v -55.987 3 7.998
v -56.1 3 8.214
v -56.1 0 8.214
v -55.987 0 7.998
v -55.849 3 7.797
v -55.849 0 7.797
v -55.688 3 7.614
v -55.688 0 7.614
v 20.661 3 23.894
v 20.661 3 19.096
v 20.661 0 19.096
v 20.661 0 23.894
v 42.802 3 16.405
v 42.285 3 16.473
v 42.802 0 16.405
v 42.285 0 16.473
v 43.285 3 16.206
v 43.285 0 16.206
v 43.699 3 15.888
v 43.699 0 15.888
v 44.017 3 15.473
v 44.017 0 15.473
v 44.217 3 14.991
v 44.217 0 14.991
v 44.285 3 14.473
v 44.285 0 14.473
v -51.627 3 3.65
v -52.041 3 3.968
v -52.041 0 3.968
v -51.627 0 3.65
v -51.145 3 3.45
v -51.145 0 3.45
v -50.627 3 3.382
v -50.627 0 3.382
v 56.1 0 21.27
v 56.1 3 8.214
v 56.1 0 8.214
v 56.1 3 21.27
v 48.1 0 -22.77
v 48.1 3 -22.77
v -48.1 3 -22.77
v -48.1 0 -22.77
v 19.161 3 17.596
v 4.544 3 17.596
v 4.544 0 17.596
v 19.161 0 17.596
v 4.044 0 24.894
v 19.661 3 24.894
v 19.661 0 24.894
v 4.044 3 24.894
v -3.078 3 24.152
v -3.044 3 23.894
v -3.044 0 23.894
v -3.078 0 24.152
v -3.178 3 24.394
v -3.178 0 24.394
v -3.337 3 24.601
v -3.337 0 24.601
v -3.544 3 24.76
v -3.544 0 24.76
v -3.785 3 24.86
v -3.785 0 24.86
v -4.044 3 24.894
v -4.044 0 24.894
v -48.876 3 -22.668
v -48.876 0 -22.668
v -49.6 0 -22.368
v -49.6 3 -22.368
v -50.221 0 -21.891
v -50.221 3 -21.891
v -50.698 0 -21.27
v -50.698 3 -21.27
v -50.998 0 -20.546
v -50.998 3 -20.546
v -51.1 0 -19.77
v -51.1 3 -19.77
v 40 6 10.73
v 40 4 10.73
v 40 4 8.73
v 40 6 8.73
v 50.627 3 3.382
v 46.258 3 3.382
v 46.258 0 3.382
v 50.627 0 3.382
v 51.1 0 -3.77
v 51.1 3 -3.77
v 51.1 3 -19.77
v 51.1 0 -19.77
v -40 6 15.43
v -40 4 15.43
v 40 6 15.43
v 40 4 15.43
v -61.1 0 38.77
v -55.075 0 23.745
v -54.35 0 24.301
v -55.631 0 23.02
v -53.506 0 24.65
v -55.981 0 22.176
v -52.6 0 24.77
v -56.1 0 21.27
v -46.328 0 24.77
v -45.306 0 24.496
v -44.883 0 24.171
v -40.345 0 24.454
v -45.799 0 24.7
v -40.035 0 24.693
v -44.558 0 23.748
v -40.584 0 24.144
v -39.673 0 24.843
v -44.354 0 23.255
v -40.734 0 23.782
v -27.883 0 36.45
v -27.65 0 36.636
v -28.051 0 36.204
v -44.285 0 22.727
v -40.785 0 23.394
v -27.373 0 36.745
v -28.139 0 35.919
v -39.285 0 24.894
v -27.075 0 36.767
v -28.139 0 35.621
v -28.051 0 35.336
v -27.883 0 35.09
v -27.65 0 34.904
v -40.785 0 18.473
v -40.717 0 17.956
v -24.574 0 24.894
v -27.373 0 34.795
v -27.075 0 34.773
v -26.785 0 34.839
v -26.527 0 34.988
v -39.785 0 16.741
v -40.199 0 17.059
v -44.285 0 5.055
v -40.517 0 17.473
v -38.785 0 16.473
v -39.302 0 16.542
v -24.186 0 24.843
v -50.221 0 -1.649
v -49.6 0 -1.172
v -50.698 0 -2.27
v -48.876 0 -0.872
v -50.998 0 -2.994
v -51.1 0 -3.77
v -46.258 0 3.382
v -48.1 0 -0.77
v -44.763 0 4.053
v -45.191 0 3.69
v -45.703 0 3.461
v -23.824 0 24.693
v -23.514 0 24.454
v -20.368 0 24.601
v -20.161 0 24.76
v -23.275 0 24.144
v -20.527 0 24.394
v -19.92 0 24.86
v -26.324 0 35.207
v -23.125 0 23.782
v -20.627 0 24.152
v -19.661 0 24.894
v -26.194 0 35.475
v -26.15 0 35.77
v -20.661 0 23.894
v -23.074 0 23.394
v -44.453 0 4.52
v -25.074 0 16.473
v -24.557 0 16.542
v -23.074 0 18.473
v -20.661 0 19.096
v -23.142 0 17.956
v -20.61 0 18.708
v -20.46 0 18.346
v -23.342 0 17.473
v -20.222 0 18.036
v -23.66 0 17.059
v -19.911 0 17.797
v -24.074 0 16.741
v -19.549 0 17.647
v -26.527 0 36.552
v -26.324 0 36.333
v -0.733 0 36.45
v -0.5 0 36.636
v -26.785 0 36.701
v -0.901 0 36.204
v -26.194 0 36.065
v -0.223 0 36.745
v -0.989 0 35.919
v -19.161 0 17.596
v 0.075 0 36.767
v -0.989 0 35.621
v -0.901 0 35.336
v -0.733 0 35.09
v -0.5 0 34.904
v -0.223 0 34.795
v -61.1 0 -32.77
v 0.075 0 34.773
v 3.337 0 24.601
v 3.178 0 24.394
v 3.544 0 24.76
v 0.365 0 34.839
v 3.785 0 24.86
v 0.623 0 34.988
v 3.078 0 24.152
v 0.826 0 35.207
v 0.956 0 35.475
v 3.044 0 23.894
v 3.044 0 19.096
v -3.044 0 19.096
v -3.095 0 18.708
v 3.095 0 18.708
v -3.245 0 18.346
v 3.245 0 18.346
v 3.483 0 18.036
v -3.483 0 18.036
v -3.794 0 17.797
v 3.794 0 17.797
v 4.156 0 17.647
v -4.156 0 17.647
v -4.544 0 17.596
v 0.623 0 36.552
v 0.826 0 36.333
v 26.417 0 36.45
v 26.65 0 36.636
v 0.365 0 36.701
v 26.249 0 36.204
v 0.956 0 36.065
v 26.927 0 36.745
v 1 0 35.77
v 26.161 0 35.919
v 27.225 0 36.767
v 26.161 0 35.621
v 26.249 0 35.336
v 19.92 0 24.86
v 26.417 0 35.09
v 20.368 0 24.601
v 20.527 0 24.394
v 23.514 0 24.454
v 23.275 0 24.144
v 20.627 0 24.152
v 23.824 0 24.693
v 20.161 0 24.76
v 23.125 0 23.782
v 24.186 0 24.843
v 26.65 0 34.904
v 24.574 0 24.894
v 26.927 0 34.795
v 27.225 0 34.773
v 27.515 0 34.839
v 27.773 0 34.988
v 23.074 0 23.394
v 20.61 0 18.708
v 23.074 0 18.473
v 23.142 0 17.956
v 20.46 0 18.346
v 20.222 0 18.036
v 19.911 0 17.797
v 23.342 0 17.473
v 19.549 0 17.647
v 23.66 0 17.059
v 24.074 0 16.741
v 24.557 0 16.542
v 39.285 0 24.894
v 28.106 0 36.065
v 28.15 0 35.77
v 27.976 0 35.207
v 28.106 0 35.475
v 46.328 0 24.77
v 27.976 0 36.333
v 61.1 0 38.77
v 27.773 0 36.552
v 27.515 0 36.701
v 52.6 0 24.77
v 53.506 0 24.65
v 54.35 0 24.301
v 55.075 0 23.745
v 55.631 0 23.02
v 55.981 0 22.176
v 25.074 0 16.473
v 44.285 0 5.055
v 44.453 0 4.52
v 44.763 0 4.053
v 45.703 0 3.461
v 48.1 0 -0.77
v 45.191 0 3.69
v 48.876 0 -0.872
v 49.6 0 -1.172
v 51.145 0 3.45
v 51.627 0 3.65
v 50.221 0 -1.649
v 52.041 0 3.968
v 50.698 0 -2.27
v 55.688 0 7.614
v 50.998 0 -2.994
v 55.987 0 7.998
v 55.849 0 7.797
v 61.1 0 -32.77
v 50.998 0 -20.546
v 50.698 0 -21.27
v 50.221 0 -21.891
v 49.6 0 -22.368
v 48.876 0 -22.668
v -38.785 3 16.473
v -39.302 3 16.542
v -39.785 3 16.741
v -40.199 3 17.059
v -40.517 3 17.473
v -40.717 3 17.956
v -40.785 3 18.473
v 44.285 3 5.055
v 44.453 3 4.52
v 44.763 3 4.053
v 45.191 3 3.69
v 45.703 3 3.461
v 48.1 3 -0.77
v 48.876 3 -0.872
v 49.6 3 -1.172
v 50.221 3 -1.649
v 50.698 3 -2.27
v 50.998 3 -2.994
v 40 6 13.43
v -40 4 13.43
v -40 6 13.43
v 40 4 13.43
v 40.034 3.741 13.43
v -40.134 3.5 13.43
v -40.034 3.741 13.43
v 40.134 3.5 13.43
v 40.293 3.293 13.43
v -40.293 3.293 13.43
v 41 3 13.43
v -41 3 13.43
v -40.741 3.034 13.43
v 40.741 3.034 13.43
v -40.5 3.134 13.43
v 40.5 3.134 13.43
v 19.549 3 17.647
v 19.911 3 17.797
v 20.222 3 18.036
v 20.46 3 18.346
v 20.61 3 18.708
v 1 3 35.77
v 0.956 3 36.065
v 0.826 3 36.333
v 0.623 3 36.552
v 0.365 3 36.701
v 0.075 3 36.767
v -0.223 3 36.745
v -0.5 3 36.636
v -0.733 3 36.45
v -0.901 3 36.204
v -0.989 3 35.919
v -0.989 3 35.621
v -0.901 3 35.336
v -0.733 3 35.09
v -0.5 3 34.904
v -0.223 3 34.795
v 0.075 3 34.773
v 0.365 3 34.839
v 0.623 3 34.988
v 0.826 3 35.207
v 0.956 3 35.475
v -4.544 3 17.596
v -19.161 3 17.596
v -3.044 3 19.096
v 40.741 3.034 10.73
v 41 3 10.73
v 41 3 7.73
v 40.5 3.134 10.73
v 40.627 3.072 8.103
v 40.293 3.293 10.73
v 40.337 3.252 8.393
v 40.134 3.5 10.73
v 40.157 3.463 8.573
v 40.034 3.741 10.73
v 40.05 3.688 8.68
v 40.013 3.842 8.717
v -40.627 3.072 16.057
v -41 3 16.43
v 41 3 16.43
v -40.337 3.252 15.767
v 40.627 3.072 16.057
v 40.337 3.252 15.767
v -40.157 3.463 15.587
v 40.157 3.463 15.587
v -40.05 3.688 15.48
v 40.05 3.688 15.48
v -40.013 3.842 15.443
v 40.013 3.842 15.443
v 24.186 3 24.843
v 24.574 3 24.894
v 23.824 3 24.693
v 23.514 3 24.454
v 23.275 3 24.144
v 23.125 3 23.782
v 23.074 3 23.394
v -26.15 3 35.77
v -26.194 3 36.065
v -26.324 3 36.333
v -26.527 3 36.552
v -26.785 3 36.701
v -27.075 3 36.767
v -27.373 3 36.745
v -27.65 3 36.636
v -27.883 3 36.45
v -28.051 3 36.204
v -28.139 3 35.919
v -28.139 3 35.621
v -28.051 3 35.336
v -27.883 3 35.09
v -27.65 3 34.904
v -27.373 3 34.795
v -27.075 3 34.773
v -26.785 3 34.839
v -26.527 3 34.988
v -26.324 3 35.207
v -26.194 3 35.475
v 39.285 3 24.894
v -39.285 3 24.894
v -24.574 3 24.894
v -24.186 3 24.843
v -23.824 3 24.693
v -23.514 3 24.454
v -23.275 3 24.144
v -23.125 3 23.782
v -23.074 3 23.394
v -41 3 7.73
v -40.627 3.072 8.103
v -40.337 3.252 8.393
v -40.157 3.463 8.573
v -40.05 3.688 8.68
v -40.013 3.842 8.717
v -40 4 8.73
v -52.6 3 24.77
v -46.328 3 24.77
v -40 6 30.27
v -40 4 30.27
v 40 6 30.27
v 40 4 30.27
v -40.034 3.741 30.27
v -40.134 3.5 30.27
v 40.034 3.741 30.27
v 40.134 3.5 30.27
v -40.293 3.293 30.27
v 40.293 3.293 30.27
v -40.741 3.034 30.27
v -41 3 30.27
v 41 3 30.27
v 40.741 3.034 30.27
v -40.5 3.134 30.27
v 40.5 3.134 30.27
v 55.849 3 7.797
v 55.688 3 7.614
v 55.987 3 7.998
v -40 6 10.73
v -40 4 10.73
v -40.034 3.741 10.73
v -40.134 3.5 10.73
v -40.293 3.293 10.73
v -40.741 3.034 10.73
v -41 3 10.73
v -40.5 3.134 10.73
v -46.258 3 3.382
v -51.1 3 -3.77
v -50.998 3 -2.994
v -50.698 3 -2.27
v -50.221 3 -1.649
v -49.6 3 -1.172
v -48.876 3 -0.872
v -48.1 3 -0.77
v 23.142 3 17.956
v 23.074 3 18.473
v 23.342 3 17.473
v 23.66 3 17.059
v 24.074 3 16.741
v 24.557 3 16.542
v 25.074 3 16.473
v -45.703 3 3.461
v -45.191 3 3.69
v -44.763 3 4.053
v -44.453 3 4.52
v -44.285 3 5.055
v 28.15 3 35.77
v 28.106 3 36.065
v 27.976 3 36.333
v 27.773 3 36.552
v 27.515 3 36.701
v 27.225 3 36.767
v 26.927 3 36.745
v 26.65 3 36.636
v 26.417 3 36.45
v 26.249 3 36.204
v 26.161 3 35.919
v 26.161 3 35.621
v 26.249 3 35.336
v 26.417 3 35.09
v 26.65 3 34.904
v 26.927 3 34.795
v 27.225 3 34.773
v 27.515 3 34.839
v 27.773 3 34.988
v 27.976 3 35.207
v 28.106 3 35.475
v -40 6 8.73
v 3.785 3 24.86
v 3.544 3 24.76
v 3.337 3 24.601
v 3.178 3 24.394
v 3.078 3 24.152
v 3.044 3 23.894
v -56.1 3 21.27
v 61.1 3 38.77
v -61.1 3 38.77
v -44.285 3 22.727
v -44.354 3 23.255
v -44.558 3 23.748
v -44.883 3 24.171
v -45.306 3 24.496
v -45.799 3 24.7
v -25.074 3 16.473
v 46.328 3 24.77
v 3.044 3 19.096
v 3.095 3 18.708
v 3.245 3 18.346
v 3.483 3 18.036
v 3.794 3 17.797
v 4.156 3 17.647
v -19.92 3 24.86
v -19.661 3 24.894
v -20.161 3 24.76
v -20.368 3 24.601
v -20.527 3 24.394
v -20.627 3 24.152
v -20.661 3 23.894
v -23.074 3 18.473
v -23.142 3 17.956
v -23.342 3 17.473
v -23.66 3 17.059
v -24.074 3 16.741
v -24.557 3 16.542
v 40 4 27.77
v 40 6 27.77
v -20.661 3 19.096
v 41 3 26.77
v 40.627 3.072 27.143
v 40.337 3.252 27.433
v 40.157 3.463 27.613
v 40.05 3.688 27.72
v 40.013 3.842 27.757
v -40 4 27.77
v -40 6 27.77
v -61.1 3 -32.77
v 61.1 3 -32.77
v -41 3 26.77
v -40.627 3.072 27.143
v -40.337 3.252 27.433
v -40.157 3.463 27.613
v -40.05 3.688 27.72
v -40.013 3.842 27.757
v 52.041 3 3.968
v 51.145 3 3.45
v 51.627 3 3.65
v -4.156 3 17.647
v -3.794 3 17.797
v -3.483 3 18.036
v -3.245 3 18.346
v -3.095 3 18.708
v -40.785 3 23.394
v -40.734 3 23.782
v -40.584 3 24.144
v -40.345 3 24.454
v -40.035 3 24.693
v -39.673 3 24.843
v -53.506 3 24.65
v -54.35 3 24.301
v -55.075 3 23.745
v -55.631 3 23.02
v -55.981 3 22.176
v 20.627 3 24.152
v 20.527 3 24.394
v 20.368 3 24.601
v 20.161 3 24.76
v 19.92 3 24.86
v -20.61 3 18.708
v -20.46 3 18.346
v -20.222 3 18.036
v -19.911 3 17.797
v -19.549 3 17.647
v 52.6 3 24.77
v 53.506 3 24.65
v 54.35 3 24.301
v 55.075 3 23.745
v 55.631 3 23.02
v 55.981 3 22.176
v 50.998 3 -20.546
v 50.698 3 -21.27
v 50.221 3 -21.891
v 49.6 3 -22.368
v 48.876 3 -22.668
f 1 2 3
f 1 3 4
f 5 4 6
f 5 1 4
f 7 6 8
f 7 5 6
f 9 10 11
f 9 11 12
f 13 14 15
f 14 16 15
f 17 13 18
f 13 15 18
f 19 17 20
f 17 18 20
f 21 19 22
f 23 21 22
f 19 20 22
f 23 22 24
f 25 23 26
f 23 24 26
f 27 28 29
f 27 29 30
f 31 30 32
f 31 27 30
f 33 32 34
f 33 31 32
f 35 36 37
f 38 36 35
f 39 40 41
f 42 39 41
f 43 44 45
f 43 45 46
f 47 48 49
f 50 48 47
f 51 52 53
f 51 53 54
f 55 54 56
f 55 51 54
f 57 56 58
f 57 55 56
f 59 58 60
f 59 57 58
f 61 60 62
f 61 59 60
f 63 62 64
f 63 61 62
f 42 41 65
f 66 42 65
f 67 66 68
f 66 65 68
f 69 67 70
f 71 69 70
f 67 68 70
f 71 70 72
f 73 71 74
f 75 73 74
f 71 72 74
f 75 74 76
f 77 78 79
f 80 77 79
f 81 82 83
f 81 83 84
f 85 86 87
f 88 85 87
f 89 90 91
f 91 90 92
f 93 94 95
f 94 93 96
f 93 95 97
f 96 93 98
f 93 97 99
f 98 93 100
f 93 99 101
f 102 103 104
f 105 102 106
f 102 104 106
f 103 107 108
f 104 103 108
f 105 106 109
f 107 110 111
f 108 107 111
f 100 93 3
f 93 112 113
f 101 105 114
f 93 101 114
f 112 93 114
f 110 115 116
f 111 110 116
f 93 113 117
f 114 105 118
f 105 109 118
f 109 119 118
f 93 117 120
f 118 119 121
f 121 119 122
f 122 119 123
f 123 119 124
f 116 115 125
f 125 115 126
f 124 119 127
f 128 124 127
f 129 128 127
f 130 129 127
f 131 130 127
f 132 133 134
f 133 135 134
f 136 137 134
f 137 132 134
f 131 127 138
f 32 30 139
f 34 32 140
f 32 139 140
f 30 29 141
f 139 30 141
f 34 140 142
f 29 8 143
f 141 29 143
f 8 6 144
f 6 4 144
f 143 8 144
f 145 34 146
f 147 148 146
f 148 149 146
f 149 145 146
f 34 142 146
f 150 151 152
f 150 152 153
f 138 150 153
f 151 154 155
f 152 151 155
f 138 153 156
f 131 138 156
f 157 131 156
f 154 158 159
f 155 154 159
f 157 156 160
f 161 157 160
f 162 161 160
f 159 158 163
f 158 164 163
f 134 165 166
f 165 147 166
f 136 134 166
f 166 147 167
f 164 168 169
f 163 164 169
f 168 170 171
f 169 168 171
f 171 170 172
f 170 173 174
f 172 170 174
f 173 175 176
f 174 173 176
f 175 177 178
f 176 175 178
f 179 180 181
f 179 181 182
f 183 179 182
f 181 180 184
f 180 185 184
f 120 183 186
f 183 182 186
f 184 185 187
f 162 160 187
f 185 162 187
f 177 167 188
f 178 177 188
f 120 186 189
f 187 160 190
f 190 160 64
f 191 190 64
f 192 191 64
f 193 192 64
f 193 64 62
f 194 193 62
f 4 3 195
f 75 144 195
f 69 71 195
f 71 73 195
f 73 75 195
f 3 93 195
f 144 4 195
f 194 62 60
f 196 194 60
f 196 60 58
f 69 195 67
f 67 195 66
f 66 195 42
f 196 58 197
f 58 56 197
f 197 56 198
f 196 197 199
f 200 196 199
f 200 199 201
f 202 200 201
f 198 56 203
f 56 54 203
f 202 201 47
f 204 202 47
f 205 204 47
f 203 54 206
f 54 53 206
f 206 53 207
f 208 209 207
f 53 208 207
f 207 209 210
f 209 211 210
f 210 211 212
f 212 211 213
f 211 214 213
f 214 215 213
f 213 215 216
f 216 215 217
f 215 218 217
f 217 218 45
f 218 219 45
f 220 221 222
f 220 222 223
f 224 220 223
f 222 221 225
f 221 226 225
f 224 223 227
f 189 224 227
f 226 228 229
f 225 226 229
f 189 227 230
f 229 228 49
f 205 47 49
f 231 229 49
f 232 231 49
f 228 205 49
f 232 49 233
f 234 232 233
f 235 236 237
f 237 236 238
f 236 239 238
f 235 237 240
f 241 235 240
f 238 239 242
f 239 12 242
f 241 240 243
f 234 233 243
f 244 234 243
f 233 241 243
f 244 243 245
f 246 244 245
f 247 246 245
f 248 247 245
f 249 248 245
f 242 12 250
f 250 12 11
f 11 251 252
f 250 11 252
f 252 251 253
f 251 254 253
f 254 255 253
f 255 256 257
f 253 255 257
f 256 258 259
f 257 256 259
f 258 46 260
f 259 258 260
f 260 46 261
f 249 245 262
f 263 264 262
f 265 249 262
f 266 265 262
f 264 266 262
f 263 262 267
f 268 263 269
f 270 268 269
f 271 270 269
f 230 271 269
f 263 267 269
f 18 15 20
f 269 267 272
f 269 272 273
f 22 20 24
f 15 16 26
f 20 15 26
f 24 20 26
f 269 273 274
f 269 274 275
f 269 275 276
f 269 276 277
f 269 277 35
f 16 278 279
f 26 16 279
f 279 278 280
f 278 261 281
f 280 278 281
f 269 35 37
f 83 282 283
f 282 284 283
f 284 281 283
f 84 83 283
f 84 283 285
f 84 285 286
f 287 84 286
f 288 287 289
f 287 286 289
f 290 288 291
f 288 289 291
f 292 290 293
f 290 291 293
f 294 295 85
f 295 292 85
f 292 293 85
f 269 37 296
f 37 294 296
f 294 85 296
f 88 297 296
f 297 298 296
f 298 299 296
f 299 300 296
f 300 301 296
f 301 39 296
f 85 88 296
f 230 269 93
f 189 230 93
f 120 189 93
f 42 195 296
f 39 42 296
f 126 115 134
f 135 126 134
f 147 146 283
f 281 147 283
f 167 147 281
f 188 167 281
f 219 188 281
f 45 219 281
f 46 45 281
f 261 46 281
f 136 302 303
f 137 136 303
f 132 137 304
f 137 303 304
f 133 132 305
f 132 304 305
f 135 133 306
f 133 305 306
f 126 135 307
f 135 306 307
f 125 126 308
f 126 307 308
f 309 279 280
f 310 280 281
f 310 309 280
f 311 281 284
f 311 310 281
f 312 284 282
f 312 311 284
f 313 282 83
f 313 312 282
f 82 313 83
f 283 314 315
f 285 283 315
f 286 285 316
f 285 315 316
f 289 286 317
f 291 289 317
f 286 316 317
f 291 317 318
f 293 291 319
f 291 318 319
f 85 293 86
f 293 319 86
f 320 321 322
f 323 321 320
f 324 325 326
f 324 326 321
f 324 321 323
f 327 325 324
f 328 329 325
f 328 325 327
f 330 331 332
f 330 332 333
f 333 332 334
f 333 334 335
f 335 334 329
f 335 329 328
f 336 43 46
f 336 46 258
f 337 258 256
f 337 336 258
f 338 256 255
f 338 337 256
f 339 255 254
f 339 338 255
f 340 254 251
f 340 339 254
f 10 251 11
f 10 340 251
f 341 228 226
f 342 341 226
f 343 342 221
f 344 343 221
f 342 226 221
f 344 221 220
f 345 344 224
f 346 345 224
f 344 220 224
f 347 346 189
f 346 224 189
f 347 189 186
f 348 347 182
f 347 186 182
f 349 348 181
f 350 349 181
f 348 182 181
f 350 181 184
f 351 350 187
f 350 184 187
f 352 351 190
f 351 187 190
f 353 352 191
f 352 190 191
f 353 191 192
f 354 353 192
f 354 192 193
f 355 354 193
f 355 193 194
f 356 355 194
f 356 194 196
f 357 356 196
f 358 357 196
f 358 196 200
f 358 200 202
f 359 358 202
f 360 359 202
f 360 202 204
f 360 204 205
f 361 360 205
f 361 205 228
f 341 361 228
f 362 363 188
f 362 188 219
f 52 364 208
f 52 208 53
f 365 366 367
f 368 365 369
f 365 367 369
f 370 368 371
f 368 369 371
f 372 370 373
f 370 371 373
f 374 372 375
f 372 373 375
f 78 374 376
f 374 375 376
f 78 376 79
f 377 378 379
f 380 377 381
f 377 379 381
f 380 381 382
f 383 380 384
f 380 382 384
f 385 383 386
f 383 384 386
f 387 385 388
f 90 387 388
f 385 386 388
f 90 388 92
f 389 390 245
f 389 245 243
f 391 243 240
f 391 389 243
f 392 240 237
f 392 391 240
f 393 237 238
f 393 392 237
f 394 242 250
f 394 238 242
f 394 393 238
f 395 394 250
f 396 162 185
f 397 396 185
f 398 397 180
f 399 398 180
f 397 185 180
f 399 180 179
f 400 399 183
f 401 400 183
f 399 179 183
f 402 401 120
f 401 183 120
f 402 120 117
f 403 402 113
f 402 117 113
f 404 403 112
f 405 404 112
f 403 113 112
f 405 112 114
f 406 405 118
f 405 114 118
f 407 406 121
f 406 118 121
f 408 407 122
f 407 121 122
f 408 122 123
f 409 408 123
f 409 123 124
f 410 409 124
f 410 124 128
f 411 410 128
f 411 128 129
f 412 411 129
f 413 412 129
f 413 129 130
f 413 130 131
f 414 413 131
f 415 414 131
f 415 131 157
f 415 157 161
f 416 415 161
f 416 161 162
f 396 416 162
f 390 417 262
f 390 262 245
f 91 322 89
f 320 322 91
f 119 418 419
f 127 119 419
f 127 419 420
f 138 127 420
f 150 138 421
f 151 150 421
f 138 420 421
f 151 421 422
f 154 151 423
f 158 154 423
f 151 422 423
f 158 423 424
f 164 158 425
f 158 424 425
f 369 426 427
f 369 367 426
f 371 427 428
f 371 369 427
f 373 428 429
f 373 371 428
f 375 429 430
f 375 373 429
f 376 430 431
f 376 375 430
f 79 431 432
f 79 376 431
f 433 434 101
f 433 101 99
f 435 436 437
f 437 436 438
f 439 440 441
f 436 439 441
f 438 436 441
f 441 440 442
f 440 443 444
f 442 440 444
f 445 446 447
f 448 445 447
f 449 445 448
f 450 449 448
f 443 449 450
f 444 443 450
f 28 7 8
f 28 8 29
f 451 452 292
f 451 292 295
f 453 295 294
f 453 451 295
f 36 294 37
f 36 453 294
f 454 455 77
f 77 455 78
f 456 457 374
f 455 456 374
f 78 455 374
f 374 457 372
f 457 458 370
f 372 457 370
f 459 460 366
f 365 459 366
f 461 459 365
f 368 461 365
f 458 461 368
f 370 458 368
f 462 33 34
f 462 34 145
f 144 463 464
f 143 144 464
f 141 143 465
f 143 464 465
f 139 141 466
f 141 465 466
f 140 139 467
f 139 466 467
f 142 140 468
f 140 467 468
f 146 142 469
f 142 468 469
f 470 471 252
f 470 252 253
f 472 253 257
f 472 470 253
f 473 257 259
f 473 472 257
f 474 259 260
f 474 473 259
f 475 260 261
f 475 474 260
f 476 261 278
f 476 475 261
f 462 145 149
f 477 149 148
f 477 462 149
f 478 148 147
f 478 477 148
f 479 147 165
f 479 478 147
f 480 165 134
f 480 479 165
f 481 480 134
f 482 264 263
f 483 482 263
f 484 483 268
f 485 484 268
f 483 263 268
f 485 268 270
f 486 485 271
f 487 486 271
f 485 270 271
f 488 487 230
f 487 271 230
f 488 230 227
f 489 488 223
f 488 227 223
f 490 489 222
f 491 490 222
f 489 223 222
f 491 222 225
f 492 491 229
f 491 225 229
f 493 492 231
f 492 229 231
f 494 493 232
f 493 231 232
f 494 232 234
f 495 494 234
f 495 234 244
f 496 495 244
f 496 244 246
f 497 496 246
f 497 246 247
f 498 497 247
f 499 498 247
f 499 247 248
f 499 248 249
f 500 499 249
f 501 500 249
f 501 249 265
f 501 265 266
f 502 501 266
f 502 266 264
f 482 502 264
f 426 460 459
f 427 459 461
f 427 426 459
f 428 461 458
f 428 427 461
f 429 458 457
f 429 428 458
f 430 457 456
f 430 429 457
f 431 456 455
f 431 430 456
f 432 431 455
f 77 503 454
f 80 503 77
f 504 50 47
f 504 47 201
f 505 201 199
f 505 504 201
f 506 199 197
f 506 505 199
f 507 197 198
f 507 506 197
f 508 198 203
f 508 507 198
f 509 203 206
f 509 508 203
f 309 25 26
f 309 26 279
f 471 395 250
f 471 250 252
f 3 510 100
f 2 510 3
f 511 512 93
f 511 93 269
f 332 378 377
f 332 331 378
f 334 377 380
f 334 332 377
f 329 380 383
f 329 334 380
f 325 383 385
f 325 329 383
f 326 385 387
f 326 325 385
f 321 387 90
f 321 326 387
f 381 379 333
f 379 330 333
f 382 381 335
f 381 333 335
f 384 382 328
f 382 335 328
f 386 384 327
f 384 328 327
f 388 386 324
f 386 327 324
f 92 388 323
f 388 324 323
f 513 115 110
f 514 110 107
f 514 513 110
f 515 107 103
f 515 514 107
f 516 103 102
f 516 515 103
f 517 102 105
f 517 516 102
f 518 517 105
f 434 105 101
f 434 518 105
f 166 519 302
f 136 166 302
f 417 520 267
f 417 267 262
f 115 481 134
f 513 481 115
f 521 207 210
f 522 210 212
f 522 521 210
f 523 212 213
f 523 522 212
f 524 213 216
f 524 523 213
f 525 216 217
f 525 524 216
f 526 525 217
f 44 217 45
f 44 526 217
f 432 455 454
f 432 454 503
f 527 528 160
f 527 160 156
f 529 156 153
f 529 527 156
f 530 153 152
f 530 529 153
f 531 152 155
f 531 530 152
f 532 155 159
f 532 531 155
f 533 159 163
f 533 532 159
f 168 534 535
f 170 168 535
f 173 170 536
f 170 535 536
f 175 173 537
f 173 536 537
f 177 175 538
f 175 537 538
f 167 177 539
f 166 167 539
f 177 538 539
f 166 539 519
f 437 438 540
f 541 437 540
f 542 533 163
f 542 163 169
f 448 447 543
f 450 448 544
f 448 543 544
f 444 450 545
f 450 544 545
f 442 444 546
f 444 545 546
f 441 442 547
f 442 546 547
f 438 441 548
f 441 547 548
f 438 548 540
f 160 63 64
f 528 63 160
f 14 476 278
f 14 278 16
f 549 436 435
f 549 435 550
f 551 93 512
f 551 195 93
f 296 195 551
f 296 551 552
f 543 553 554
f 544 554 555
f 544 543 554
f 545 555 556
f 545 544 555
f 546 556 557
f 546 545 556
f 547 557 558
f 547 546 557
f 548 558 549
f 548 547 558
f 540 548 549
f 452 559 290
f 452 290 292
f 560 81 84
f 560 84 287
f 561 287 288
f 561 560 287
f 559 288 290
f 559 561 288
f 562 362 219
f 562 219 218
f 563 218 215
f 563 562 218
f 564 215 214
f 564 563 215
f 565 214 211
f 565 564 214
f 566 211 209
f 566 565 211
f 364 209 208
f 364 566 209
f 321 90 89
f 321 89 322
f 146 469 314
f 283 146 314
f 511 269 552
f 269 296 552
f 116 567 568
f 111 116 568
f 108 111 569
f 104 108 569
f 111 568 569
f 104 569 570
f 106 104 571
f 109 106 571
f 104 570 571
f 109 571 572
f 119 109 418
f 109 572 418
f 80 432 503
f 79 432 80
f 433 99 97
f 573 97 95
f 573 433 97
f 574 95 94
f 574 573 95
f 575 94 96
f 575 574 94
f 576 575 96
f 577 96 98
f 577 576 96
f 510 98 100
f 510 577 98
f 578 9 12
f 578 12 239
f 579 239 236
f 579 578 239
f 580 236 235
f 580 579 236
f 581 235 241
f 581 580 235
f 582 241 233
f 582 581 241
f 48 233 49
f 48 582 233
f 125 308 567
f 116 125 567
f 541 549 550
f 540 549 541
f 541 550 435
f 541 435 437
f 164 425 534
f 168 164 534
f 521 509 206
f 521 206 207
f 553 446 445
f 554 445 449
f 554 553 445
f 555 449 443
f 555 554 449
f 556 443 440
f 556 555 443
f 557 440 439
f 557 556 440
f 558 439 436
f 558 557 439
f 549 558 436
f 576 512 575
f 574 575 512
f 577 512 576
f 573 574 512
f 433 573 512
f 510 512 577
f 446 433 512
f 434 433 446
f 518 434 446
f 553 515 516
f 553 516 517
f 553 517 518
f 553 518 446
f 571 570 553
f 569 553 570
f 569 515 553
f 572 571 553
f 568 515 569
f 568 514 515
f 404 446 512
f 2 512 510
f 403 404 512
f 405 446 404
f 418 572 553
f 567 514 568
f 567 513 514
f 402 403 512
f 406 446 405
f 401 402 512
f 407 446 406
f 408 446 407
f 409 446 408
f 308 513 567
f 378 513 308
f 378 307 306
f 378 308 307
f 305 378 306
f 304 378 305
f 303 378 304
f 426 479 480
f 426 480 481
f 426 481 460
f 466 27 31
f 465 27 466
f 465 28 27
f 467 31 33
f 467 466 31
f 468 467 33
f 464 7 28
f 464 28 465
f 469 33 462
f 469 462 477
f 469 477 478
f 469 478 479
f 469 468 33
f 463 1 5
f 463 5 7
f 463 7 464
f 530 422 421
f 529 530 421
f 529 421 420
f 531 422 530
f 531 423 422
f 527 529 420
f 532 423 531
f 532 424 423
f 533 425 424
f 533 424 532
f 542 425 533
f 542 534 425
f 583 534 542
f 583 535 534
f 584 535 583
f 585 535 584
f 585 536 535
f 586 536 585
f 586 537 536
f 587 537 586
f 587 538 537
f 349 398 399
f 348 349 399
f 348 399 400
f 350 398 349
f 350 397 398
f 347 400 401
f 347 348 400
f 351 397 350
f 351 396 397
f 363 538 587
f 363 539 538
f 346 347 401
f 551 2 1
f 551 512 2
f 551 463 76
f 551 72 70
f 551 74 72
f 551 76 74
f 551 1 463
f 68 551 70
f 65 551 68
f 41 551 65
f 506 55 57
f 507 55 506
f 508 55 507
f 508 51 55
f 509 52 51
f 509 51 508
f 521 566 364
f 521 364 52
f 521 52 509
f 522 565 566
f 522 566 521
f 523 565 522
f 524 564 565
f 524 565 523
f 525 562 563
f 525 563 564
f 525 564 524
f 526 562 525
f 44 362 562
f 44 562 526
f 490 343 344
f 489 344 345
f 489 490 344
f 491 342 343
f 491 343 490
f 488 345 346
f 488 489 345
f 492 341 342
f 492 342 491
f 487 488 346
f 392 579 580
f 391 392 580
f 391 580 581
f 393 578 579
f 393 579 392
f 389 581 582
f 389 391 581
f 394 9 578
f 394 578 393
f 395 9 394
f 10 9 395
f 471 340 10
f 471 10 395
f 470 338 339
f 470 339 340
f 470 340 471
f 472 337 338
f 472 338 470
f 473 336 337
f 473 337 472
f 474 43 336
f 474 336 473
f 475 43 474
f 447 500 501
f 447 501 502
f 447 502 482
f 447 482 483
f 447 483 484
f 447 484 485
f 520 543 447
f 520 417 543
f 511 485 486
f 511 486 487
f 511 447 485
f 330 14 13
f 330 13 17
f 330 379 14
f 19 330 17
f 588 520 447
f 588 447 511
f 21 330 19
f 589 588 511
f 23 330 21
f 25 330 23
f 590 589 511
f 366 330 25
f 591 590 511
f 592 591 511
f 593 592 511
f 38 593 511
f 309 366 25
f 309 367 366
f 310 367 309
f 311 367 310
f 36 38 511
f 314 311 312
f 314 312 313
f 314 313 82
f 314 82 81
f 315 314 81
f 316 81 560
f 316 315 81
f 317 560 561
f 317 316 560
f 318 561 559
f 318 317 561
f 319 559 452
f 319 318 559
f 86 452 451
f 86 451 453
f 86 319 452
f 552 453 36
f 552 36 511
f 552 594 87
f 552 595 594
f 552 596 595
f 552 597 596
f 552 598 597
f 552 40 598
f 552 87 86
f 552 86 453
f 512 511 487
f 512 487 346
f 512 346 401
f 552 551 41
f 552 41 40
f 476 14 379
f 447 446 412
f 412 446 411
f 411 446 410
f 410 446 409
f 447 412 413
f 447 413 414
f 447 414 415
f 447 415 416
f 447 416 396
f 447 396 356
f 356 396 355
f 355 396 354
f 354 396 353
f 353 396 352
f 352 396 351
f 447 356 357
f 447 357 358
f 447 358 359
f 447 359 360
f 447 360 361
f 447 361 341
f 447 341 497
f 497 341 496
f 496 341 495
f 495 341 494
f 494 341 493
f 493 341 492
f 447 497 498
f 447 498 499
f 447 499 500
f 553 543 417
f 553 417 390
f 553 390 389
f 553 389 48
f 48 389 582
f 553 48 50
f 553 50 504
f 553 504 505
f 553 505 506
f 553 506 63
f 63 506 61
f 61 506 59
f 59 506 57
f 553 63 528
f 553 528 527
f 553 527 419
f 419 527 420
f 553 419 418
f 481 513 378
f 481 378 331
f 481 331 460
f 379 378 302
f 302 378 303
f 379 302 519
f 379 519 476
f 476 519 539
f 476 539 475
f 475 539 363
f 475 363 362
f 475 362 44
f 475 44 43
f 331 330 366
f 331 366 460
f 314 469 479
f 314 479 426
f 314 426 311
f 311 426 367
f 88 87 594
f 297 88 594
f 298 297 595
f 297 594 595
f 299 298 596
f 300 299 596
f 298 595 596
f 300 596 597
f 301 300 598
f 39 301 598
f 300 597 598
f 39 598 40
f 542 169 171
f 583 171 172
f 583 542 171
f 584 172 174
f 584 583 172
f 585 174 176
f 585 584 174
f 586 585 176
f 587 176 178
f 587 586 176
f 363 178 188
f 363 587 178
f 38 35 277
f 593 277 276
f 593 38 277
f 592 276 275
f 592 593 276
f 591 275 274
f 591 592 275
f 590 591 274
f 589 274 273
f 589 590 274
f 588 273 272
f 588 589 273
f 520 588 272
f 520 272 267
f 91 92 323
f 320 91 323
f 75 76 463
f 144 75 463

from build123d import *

# Parameters (mm, degrees)
SKETCH1_W           = 122.2
SKETCH1_H           = 65.54
BOSS_EXTRUDE1_DEPTH = 3
SKETCH2_W           = 80
SKETCH2_H           = 2
BOSS_EXTRUDE2_DEPTH = 10
FILLET1_R           = 1
SKETCH3_W           = 80
SKETCH3_H           = 2
CUT_EXTRUDE1_DEPTH  = 7
SKETCH4_W           = 80
SKETCH4_H           = 2.5
BOSS_EXTRUDE3_DEPTH = 3
FILLET2_R           = 1
CUT_EXTRUDE2_DEPTH  = 10
CUT_EXTRUDE3_DEPTH  = 10
SKETCH7_W           = 122.2
SKETCH7_H           = 3
BOSS_EXTRUDE4_DEPTH = 6
SKETCH8_R           = 1
CUT_EXTRUDE4_DEPTH  = 6
FILLET3_R           = 2


with BuildPart() as part:
    # Sketch1 → Boss-Extrude1 (new body)
    with BuildSketch(Plane(origin=(0, 0, 0), x_dir=(1, 0, 0), z_dir=(0, 1, 0))):
        Rectangle(SKETCH1_W, SKETCH1_H)
    extrude(amount=BOSS_EXTRUDE1_DEPTH)

    # Sketch2 → Boss-Extrude2 (add)
    with BuildSketch(Plane(origin=(0, 3, 0), x_dir=(1, 0, 0), z_dir=(0, 1, 0))):
        with Locations((0, -9.73)):
            Rectangle(SKETCH2_W, SKETCH2_H)
        with Locations((0, -14.43)):
            Rectangle(SKETCH2_W, SKETCH2_H)
    extrude(amount=BOSS_EXTRUDE2_DEPTH)

    # Fillet1
    fillet1_edges = [part.edges().sort_by_distance(p)[0] for p in [
        (40, 3, 14.43),
        (0, 3, 15.43),
        (-40, 3, 14.43),
        (40, 3, 9.73),
        (0, 3, 8.73),
        (-40, 3, 9.73),
    ]]
    fillet(fillet1_edges, radius=FILLET1_R)

    # Sketch3 → Cut-Extrude1 (cut)
    with BuildSketch(Plane(origin=(0, 13, 0), x_dir=(1, 0, 0), z_dir=(0, 1, 0))):
        with Locations((0, -9.73)):
            Rectangle(SKETCH3_W, SKETCH3_H)
        with Locations((0, -14.43)):
            Rectangle(SKETCH3_W, SKETCH3_H)
    extrude(amount=-CUT_EXTRUDE1_DEPTH, mode=Mode.SUBTRACT)

    # Sketch4 → Boss-Extrude3 (add)
    with BuildSketch(Plane(origin=(0, 3, 0), x_dir=(1, 0, 0), z_dir=(0, 1, 0))):
        with Locations((0, -29.02)):
            Rectangle(SKETCH4_W, SKETCH4_H)
    boss_extrude3 = extrude(amount=BOSS_EXTRUDE3_DEPTH)

    # Fillet2
    fillet2_edges = [part.edges().sort_by_distance(p)[0] for p in [
        (40, 3, 29.02),
        (0, 3, 27.77),
        (-40, 3, 29.02),
    ]]
    fillet(fillet2_edges, radius=FILLET2_R)

    # Mirror1: Boss-Extrude3 across plane
    add(boss_extrude3.mirror(Plane.ZY))

    # Sketch5 → Cut-Extrude2 (cut)
    with BuildSketch(Plane(origin=(0, 3, 0), x_dir=(1, 0, 0), z_dir=(0, 1, 0))):
        with BuildLine():
            Line((48.1, 22.77), (6.311514948, 22.77))
            Line((6.311514948, 22.77), (-48.1, 22.77))
            ThreePointArc((-48.1, 22.77), (-50.221320344, 21.891320344), (-51.1, 19.77))
            Line((-51.1, 19.77), (-51.1, 3.77))
            ThreePointArc((-51.1, 3.77), (-50.221320344, 1.648679656), (-48.1, 0.77))
            Line((-48.1, 0.77), (48.1, 0.77))
            ThreePointArc((48.1, 0.77), (50.221320344, 1.648679656), (51.1, 3.77))
            Line((51.1, 3.77), (51.1, 19.77))
            ThreePointArc((51.1, 19.77), (50.221320344, 21.891320344), (48.1, 22.77))
        make_face()
    extrude(amount=-CUT_EXTRUDE2_DEPTH, mode=Mode.SUBTRACT)

    # Sketch6 → Cut-Extrude3 (cut)
    with BuildSketch(Plane(origin=(0, 3, 0), x_dir=(1, 0, 0), z_dir=(0, 1, 0))):
        with BuildLine():
            ThreePointArc((24.574193631, -24.893622011), (23.513533459, -24.454282183), (23.074193631, -23.393622011))
            Line((23.074193631, -23.393622011), (23.074193631, -18.473462095))
            ThreePointArc((23.074193631, -18.473462095), (23.659980069, -17.059248532), (25.074193631, -16.473462095))
            Line((25.074193631, -16.473462095), (38.784700518, -16.473462095))
            Line((38.784700518, -16.473462095), (44.284700518, -16.473462095))
            Line((44.284700518, -16.473462095), (44.284700518, -5.054704437))
            ThreePointArc((44.284700518, -5.054704437), (44.964391332, -3.856403354), (46.257750275, -3.381927082))
            Line((46.257750275, -3.381927082), (50.626867349, -3.381927082))
            ThreePointArc((50.626867349, -3.381927082), (51.392234214, -3.534168016), (52.041080911, -3.967713519))
            Line((52.041080911, -3.967713519), (55.687864116, -7.614496724))
            ThreePointArc((55.687864116, -7.614496724), (55.921387017, -7.895147518), (56.1, -8.213573672))
            Line((56.1, -8.213573672), (56.1, -21.269749634))
            ThreePointArc((56.1, -21.269749634), (55.074873734, -23.744623369), (52.6, -24.769749634))
            Line((52.6, -24.769749634), (46.32782558, -24.769749634))
            Line((46.32782558, -24.769749634), (39.284700518, -24.893622011))
            Line((39.284700518, -24.893622011), (24.574193631, -24.893622011))
        make_face()
        with BuildLine():
            ThreePointArc((20.660852384, -23.893622011), (20.367959165, -24.600728792), (19.660852384, -24.893622011))
            Line((19.660852384, -24.893622011), (4.043952302, -24.893622011))
            ThreePointArc((4.043952302, -24.893622011), (3.336845521, -24.600728792), (3.043952302, -23.893622011))
            Line((3.043952302, -23.893622011), (3.043952302, -19.096324264))
            ThreePointArc((3.043952302, -19.096324264), (3.48329213, -18.035664092), (4.543952302, -17.596324264))
            Line((4.543952302, -17.596324264), (19.160852384, -17.596324264))
            ThreePointArc((19.160852384, -17.596324264), (20.221512556, -18.035664092), (20.660852384, -19.096324264))
            Line((20.660852384, -19.096324264), (20.660852384, -23.893622011))
        make_face()
        with BuildLine():
            ThreePointArc((-20.660852384, -19.096324264), (-20.221512556, -18.035664092), (-19.160852384, -17.596324264))
            Line((-19.160852384, -17.596324264), (-4.543952302, -17.596324264))
            ThreePointArc((-4.543952302, -17.596324264), (-3.48329213, -18.035664092), (-3.043952302, -19.096324264))
            Line((-3.043952302, -19.096324264), (-3.043952302, -23.893622011))
            ThreePointArc((-3.043952302, -23.893622011), (-3.336845521, -24.600728792), (-4.043952302, -24.893622011))
            Line((-4.043952302, -24.893622011), (-19.660852384, -24.893622011))
            ThreePointArc((-19.660852384, -24.893622011), (-20.367959165, -24.600728792), (-20.660852384, -23.893622011))
            Line((-20.660852384, -23.893622011), (-20.660852384, -19.096324264))
        make_face()
        with BuildLine():
            Line((-56.1, -21.269749634), (-56.1, -8.213573672))
            ThreePointArc((-56.1, -8.213573672), (-55.921387017, -7.895147518), (-55.687864116, -7.614496724))
            Line((-55.687864116, -7.614496724), (-52.041080911, -3.967713519))
            ThreePointArc((-52.041080911, -3.967713519), (-51.392234214, -3.534168016), (-50.626867349, -3.381927082))
            Line((-50.626867349, -3.381927082), (-46.257750275, -3.381927082))
            ThreePointArc((-46.257750275, -3.381927082), (-44.964391332, -3.856403354), (-44.284700518, -5.054704437))
            Line((-44.284700518, -5.054704437), (-44.284700518, -22.726624573))
            ThreePointArc((-44.284700518, -22.726624573), (-44.883117994, -24.171332159), (-46.32782558, -24.769749634))
            Line((-46.32782558, -24.769749634), (-52.6, -24.769749634))
            ThreePointArc((-52.6, -24.769749634), (-55.074873734, -23.744623369), (-56.1, -21.269749634))
        make_face()
        with BuildLine():
            Line((-39.284700518, -24.893622011), (-24.574193631, -24.893622011))
            ThreePointArc((-24.574193631, -24.893622011), (-23.513533459, -24.454282183), (-23.074193631, -23.393622011))
            Line((-23.074193631, -23.393622011), (-23.074193631, -18.473462095))
            ThreePointArc((-23.074193631, -18.473462095), (-23.659980069, -17.059248532), (-25.074193631, -16.473462095))
            Line((-25.074193631, -16.473462095), (-38.784700518, -16.473462095))
            ThreePointArc((-38.784700518, -16.473462095), (-40.198914081, -17.059248532), (-40.784700518, -18.473462095))
            Line((-40.784700518, -18.473462095), (-40.784700518, -23.393622011))
            ThreePointArc((-40.784700518, -23.393622011), (-40.34536069, -24.454282183), (-39.284700518, -24.893622011))
        make_face()
    extrude(amount=-CUT_EXTRUDE3_DEPTH, mode=Mode.SUBTRACT)

    # Sketch7 → Boss-Extrude4 (add)
    with BuildSketch(Plane.XY.offset(32.77)):
        with Locations((0, 1.5)):
            Rectangle(SKETCH7_W, SKETCH7_H)
    extrude(amount=BOSS_EXTRUDE4_DEPTH)

    # Sketch8 → Cut-Extrude4 (cut)
    with BuildSketch(Plane.XZ):
        with Locations((0, 35.77)):
            Circle(SKETCH8_R)
        with Locations((-27.15, 35.77)):
            Circle(SKETCH8_R)
        with Locations((27.15, 35.77)):
            Circle(SKETCH8_R)
    extrude(amount=-CUT_EXTRUDE4_DEPTH, mode=Mode.SUBTRACT)

    # Fillet3
    fillet3_edges = [part.edges().sort_by_distance(p)[0] for p in [
        (44.284700518, 1.5, 16.473462095),
    ]]
    fillet(fillet3_edges, radius=FILLET3_R)


solid = part.part
